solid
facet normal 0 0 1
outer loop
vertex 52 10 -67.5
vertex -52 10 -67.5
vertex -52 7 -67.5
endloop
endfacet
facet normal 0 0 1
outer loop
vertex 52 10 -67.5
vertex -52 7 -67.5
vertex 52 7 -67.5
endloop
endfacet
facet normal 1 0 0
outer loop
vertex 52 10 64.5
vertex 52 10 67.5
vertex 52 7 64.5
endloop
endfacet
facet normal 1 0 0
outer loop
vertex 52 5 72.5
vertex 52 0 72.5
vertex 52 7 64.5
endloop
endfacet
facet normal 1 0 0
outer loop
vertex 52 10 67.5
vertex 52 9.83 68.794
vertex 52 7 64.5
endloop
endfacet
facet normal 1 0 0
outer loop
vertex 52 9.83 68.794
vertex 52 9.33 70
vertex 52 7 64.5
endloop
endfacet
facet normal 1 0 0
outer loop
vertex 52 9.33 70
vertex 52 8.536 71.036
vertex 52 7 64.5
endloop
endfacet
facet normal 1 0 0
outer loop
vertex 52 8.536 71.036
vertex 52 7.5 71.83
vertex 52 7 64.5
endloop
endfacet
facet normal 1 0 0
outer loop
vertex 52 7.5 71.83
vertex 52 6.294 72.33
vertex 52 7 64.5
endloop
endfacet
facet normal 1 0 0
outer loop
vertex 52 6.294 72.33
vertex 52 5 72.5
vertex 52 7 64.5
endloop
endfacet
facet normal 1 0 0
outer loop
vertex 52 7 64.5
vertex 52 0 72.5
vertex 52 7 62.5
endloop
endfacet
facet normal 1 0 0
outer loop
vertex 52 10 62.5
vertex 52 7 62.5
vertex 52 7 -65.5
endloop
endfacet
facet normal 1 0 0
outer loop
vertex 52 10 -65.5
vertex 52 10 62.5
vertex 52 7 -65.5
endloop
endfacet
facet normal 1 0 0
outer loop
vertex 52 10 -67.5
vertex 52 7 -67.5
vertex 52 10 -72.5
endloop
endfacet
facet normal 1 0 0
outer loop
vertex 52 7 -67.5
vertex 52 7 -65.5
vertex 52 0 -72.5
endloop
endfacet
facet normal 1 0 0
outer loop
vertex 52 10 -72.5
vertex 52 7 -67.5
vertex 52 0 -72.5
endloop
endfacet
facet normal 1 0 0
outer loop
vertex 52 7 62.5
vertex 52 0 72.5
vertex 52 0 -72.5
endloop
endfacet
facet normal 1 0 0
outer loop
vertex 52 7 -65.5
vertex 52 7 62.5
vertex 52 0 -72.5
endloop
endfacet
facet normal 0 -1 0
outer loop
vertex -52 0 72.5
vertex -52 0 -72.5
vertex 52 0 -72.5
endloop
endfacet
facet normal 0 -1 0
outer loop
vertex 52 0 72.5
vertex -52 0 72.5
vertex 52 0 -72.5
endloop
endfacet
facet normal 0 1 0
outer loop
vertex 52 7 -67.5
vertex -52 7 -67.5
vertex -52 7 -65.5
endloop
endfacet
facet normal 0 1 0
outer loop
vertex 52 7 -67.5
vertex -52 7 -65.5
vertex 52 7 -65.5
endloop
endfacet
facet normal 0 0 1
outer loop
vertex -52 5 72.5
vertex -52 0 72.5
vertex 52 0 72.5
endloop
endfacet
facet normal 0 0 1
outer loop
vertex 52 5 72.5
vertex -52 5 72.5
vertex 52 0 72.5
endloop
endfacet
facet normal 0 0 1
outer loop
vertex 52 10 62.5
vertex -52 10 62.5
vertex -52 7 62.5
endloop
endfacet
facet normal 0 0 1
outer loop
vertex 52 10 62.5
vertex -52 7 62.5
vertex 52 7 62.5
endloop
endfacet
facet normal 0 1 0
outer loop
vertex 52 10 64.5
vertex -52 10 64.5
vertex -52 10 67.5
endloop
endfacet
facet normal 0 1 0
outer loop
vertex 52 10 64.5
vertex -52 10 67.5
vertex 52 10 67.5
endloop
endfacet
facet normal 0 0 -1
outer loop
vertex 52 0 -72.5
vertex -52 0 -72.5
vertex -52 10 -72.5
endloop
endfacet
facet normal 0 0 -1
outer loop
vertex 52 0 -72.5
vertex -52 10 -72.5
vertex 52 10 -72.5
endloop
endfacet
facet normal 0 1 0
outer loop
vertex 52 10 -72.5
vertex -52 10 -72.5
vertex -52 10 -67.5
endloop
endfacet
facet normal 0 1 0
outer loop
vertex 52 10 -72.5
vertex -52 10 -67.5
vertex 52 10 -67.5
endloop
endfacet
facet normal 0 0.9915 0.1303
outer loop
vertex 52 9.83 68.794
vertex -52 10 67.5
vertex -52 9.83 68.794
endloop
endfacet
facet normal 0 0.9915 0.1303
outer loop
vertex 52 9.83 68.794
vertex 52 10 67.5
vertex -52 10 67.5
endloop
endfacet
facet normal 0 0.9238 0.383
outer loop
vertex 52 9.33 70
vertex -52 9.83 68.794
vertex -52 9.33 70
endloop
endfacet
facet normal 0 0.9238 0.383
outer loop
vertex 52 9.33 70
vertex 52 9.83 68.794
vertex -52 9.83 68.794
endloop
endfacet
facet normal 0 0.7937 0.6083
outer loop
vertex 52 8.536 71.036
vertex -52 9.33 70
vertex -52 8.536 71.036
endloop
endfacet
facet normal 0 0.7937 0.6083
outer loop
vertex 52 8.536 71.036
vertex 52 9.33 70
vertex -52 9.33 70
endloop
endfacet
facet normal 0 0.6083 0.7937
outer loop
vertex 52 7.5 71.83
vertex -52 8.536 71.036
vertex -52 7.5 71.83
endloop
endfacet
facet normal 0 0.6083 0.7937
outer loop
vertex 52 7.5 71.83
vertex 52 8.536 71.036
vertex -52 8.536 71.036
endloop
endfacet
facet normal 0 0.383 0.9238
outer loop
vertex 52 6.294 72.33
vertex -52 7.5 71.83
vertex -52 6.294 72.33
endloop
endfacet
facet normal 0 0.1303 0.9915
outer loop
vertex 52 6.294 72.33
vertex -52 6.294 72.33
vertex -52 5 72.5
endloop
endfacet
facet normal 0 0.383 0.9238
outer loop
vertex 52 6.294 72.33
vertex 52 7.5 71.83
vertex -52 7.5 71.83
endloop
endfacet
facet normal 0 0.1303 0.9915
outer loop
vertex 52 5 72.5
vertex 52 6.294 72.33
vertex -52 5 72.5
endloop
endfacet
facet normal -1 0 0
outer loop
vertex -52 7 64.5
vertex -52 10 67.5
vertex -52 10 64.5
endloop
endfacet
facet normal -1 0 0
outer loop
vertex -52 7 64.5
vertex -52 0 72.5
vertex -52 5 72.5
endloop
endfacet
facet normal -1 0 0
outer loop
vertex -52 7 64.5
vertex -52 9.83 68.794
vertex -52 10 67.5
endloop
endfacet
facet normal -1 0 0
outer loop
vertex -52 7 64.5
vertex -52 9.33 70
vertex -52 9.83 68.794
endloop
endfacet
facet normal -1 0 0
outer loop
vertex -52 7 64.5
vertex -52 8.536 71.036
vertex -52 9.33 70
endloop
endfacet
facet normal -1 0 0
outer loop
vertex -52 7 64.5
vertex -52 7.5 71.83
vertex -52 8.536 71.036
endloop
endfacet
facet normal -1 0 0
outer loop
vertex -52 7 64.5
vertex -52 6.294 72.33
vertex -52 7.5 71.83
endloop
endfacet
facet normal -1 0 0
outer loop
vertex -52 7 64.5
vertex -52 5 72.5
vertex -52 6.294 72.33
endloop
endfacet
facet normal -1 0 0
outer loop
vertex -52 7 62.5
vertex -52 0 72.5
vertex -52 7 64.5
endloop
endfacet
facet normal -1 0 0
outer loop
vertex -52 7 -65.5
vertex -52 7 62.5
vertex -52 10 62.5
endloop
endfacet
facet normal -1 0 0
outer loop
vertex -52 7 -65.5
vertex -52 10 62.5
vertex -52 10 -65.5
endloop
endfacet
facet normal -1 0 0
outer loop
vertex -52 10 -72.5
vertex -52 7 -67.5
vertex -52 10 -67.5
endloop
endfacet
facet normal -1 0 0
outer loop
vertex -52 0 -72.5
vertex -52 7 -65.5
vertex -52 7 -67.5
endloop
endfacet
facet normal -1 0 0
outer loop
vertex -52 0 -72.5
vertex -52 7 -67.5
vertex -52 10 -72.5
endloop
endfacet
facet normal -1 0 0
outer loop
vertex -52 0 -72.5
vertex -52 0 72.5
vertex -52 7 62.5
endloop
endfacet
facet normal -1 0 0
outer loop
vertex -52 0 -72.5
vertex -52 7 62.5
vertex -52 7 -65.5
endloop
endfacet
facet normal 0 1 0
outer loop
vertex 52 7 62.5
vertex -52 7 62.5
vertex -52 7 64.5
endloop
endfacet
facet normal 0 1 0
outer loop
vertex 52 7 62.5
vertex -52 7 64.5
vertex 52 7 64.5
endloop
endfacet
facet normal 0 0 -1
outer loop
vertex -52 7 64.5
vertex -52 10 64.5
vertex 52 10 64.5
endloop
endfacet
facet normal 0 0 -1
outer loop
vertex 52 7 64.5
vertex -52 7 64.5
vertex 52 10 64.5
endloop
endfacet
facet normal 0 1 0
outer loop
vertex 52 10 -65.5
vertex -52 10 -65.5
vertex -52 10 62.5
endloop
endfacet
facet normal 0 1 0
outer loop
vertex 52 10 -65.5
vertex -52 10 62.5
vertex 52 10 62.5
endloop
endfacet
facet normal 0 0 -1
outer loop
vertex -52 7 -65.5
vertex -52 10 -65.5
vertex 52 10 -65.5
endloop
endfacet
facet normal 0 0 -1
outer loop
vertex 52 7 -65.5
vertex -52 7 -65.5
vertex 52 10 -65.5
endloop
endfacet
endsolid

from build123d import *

# Parameters (mm, degrees)
SKETCH1_W           = 104
SKETCH1_H           = 145
BOSS_EXTRUDE1_DEPTH = 10
SKETCH2_W           = 104
SKETCH2_H           = 2
CUT_EXTRUDE1_DEPTH  = 3
FILLET2_R           = 5


with BuildPart() as part:
    # Sketch1 → Boss-Extrude1 (new body)
    with BuildSketch(Plane(origin=(0, 0, 0), x_dir=(1, 0, 0), z_dir=(0, 1, 0))):
        Rectangle(SKETCH1_W, SKETCH1_H)
    extrude(amount=BOSS_EXTRUDE1_DEPTH)

    # Sketch2 → Cut-Extrude1 (cut)
    with BuildSketch(Plane(origin=(0, 10, 0), x_dir=(1, 0, 0), z_dir=(0, 1, 0))):
        with Locations((0, 66.5)):
            Rectangle(SKETCH2_W, SKETCH2_H)
        with Locations((0, -63.5)):
            Rectangle(SKETCH2_W, SKETCH2_H)
    extrude(amount=-CUT_EXTRUDE1_DEPTH, mode=Mode.SUBTRACT)

    # Fillet2
    fillet2_edges = [part.edges().sort_by_distance(p)[0] for p in [
        (0, 10, 72.5),
    ]]
    fillet(fillet2_edges, radius=FILLET2_R)


solid = part.part
